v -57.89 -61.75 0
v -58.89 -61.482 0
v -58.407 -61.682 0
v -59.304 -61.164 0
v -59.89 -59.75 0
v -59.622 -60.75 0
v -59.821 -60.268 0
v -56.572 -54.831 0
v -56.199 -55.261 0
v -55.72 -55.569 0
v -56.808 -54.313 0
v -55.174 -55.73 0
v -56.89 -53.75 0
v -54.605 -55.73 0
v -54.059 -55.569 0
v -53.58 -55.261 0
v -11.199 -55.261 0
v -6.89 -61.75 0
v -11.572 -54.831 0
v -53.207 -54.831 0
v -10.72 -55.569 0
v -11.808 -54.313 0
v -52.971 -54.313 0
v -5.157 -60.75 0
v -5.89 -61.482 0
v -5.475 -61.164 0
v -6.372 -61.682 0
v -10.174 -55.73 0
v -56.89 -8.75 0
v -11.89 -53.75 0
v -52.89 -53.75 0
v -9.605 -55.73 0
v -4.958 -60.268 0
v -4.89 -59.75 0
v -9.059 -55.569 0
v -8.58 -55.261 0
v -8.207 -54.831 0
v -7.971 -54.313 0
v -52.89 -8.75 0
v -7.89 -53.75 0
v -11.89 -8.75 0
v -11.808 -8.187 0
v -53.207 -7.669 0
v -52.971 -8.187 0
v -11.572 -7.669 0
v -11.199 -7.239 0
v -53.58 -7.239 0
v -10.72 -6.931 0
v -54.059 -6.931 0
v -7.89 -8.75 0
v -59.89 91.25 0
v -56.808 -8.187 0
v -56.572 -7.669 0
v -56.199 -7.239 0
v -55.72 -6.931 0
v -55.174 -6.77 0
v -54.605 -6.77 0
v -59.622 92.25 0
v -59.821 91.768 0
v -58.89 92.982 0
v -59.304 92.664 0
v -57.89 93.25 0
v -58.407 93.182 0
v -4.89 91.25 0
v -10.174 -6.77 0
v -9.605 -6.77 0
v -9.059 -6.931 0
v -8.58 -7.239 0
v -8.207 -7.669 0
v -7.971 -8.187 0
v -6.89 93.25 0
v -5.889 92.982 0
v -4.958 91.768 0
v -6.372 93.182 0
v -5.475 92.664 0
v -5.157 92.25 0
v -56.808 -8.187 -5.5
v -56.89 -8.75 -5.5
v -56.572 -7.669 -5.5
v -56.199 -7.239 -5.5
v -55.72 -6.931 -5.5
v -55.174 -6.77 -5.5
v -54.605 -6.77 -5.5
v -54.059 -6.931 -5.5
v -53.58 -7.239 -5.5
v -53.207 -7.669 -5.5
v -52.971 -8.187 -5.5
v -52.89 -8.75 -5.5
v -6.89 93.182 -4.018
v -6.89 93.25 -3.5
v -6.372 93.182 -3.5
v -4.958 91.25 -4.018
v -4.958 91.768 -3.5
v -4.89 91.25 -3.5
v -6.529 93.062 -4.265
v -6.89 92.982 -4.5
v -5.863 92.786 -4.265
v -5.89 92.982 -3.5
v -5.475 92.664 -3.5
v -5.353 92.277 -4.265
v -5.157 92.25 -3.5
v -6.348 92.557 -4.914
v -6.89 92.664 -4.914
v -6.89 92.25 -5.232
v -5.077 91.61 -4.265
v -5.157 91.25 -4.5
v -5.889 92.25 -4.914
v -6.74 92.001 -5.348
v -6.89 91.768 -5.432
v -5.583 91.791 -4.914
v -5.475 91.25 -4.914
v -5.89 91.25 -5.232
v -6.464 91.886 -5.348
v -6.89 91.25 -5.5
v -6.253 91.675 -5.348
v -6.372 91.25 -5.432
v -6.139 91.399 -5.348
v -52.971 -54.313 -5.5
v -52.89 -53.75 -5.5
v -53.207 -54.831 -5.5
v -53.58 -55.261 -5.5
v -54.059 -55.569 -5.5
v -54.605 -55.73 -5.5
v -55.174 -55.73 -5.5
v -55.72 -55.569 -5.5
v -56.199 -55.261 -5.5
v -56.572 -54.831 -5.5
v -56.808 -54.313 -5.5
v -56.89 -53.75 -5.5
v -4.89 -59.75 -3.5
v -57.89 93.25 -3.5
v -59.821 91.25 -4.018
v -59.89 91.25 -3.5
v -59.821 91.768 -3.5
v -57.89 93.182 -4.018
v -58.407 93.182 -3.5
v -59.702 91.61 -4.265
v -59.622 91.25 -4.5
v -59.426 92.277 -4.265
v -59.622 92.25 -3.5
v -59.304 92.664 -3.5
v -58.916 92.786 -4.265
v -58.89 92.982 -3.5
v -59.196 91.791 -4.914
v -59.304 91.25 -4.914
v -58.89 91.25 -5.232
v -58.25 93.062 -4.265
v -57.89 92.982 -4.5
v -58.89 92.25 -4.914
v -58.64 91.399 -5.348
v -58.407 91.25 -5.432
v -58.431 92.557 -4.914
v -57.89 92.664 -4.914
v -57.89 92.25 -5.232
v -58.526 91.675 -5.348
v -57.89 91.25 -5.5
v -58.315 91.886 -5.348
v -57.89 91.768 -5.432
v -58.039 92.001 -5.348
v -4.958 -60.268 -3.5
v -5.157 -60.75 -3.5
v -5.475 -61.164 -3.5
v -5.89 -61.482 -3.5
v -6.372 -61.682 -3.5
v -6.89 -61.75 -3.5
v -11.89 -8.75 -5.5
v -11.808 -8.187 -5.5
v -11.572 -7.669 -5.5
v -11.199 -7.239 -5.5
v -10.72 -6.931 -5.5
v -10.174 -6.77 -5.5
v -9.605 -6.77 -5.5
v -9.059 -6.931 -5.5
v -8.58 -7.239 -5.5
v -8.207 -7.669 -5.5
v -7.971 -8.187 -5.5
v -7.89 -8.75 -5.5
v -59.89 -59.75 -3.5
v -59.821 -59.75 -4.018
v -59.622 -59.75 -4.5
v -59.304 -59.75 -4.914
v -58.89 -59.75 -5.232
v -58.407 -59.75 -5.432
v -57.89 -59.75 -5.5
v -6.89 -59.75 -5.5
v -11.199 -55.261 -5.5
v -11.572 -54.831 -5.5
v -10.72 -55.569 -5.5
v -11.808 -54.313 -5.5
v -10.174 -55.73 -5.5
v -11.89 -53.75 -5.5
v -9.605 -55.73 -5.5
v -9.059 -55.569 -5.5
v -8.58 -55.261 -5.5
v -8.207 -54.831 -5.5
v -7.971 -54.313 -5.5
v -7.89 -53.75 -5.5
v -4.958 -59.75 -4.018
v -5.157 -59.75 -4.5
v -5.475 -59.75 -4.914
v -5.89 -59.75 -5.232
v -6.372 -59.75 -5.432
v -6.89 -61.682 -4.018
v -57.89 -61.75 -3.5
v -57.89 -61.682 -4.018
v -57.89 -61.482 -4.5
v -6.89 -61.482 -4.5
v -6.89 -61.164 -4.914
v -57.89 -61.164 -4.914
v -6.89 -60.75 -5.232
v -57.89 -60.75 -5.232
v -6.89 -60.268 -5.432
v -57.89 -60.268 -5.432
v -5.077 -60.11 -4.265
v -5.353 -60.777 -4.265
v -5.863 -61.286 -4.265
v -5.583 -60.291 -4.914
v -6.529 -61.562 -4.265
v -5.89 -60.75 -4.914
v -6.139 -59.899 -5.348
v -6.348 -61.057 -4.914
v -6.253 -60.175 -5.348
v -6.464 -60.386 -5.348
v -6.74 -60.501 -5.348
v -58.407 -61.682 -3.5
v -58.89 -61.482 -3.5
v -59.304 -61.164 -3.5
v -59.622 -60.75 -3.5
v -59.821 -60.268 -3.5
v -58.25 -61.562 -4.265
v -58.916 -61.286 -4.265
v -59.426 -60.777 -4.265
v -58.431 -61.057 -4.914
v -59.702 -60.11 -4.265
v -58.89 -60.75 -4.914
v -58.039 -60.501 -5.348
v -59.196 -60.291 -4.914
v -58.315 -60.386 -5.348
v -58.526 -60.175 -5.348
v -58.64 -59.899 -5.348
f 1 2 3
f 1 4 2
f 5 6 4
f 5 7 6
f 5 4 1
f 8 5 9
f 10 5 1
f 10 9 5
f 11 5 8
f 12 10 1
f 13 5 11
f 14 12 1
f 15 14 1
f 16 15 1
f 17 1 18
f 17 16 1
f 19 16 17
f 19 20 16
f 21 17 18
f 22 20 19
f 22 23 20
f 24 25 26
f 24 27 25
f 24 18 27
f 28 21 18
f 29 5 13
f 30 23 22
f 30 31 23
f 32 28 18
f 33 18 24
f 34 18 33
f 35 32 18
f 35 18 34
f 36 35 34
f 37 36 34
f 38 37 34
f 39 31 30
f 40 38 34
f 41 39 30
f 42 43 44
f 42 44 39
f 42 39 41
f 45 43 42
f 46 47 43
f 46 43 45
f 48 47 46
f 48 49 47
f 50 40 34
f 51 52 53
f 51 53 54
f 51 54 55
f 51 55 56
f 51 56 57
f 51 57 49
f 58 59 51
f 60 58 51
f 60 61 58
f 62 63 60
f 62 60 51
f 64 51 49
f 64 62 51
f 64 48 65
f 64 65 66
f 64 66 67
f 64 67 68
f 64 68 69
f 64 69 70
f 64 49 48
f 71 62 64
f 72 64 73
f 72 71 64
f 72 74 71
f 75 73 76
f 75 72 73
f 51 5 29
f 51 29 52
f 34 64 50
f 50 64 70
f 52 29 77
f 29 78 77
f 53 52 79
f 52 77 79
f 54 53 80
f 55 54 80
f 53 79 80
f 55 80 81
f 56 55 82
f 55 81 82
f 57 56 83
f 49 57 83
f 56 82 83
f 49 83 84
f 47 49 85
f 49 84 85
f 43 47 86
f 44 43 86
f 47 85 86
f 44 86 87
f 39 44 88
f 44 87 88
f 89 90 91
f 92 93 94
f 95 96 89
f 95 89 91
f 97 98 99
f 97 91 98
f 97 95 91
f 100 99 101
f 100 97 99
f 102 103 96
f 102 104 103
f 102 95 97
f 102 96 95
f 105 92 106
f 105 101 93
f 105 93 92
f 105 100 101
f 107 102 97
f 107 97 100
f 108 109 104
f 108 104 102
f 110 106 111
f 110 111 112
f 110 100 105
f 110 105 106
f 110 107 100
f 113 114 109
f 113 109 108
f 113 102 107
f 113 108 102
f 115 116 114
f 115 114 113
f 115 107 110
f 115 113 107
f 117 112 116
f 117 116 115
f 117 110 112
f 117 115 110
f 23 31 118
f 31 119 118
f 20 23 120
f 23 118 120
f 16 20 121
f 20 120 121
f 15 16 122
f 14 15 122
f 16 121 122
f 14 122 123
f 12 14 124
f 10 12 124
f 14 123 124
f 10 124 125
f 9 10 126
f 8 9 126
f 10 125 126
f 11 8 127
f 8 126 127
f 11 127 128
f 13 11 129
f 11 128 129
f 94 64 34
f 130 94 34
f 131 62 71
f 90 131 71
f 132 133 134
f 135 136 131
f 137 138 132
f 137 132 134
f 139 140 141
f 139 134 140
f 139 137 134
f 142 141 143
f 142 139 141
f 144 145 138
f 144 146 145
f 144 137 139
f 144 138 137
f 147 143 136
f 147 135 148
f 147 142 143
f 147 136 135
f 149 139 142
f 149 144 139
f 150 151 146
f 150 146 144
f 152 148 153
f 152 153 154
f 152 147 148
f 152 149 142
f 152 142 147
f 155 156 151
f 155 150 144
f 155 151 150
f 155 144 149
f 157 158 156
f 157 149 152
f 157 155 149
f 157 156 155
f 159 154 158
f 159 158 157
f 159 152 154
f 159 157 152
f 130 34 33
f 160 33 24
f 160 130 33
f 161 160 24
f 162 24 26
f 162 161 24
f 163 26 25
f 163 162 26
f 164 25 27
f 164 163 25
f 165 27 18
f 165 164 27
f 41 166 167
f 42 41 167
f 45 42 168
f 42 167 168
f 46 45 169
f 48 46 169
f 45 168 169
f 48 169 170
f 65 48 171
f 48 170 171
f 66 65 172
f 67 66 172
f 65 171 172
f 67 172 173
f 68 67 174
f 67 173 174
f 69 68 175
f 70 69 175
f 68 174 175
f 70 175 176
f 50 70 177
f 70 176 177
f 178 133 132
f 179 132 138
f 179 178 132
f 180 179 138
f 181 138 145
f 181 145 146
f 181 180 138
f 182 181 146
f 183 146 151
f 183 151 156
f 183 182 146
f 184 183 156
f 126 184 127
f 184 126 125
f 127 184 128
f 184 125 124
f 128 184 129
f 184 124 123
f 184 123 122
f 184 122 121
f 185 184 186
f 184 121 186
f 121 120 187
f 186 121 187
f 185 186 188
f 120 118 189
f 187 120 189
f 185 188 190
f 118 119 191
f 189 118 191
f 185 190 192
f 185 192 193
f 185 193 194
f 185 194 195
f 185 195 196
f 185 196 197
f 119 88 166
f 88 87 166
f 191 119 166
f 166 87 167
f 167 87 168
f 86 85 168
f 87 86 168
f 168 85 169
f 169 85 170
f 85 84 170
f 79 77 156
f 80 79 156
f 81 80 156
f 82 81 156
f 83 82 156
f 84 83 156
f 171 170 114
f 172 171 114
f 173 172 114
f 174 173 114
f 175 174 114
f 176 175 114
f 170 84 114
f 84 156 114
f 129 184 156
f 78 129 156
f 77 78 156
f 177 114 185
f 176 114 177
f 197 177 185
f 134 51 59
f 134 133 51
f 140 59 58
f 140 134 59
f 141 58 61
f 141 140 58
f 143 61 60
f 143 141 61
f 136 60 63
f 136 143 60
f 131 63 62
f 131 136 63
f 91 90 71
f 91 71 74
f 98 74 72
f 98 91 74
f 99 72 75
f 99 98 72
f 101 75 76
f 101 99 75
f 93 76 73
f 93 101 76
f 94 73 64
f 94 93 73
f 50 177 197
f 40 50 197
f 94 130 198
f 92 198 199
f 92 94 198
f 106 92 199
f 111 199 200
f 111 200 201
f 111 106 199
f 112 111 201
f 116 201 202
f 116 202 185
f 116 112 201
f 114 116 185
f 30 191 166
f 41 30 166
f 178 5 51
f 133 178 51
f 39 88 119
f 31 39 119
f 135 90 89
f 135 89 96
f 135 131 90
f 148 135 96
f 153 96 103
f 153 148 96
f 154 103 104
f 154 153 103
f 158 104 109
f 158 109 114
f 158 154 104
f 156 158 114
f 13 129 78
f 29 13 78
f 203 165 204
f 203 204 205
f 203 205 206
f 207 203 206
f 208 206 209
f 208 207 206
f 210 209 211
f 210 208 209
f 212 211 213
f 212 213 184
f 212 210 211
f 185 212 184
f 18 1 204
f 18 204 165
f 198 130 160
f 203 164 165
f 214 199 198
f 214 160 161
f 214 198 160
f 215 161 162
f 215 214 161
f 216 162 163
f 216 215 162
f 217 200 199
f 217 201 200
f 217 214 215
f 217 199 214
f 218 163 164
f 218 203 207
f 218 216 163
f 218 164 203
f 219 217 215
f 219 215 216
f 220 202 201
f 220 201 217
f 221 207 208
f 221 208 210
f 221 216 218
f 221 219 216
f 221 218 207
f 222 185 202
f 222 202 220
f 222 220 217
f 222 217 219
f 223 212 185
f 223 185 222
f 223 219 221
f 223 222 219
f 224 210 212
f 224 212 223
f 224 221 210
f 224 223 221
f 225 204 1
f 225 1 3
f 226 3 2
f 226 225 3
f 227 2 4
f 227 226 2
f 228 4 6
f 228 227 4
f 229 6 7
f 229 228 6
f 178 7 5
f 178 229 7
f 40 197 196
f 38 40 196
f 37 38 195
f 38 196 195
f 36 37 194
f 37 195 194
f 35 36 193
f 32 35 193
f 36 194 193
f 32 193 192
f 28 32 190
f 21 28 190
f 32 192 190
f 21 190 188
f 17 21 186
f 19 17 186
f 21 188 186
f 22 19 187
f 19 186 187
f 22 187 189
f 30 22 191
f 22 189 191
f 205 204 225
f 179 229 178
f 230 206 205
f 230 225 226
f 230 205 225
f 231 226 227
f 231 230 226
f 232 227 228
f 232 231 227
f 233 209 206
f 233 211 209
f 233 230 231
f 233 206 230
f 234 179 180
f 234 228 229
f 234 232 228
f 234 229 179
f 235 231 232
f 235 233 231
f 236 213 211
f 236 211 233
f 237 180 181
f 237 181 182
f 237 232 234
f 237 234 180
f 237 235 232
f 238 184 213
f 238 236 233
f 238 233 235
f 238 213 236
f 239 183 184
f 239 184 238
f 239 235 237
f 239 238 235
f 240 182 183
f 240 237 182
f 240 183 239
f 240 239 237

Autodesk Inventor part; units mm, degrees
ref_plane "YZ Plane" through (0, 0, 0) normal (1, 0, 0) x (0, 1, 0)
ref_plane "XZ Plane" through (0, 0, 0) normal (0, 1, 0) x (-1, 0, 0)
ref_plane "XY Plane" through (0, 0, 0) normal (0, 0, 1) x (1, 0, 0)
sketch "Sketch1" plane through (0, 0, 0) normal (0, 0, 1) x (1, 0, 0)
  line L0 (4.8895, 31.75) -> (-4.8895, 31.75) projected
  line L1 (-4.8895, 31.75) -> (-4.8895, -31.75) projected
  line L2 (-4.8895, -31.75) -> (4.8895, -31.75) projected
  line L3 (4.8895, -31.75) -> (4.8895, 31.75) projected
  line L4 (-4.8895, -31.75) -> (-59.8895, -31.75)
  line L5 (-59.8895, -31.75) -> (-59.8895, 93.25)
  line L6 (-59.8895, 93.25) -> (-4.8895, 93.25)
  line L7 (-4.8895, 93.25) -> (-4.8895, -31.75)
  point P0 (0, 0)
  dimension "d0" = 125
  dimension "d1" = 55
extrude "Extrusion1" add sketch "Sketch1" against normal blind 5.5 contours L1 L4 L5 L6 L7
sketch "Sketch3" plane through (-59.8895, -31.75, 0) normal (0, -1, 0) x (1, 0, 0)
  line L0 (0, 0) -> (55, 0) projected
  line L1 (0, 0) -> (0, -5.5) projected
  line L2 (55, -5.5) -> (0, -5.5) projected
  line L3 (55, 0) -> (55, -5.5) projected
  point P0 (59.8895, 0)
extrude "Extrusion2" add sketch "Sketch3" along normal blind 30
sketch "Sketch4" plane through (0, 0, -5.5) normal (0, 0, -1) x (-1, 0, 0)
  circle A0 centre (54.8895, -8.75) radius 1.25 projected
  circle A1 centre (9.8895, -8.75) radius 1.25
  circle A2 centre (54.8895, -8.75) radius 2
  circle A3 centre (9.8895, -8.75) radius 2
  line L0 (9.8895, -8.75) -> (9.8895, -53.75)
  circle A4 centre (9.8895, -53.75) radius 2
  line L1 (54.8895, -8.75) -> (54.8895, -53.75)
  circle A5 centre (54.8895, -53.75) radius 2
  line L2 (56.8895, -8.75) -> (52.8895, -8.75)
  line L3 (52.8895, -8.75) -> (52.8895, -53.75)
  line L4 (52.8895, -53.75) -> (56.8895, -53.75)
  line L5 (56.8895, -53.75) -> (56.8895, -8.75)
  line L6 (11.8895, -8.75) -> (7.8895, -8.75)
  line L7 (7.8895, -8.75) -> (7.8895, -53.75)
  line L8 (7.8895, -53.75) -> (11.8895, -53.75)
  line L9 (11.8895, -53.75) -> (11.8895, -8.75)
  point P0 (0, 0)
  dimension "d6" = 4
  dimension "d7" = 4
  dimension "d9" = 4
  dimension "d11" = 4
  dimension "d8" = 45
  dimension "d10" = 45
extrude "Extrusion3" cut sketch "Sketch4" against normal blind 30
fillet "Fillet1" radius 2 4 edges at (-59.8895, 93.25, -2.75) (-4.8895, 93.25, -2.75) (-4.8895, -61.75, -2.75) (-59.8895, -61.75, -2.75)
fillet "Fillet2" radius 2 6 edges at (-4.8895, 15.75, -5.5) (-5.4753, 92.6642, -5.5) (-32.3895, 93.25, -5.5) (-59.3037, 92.6642, -5.5) (-59.8895, 15.75, -5.5) (-32.3895, -61.75, -5.5)
properties part number "HeadBase"
